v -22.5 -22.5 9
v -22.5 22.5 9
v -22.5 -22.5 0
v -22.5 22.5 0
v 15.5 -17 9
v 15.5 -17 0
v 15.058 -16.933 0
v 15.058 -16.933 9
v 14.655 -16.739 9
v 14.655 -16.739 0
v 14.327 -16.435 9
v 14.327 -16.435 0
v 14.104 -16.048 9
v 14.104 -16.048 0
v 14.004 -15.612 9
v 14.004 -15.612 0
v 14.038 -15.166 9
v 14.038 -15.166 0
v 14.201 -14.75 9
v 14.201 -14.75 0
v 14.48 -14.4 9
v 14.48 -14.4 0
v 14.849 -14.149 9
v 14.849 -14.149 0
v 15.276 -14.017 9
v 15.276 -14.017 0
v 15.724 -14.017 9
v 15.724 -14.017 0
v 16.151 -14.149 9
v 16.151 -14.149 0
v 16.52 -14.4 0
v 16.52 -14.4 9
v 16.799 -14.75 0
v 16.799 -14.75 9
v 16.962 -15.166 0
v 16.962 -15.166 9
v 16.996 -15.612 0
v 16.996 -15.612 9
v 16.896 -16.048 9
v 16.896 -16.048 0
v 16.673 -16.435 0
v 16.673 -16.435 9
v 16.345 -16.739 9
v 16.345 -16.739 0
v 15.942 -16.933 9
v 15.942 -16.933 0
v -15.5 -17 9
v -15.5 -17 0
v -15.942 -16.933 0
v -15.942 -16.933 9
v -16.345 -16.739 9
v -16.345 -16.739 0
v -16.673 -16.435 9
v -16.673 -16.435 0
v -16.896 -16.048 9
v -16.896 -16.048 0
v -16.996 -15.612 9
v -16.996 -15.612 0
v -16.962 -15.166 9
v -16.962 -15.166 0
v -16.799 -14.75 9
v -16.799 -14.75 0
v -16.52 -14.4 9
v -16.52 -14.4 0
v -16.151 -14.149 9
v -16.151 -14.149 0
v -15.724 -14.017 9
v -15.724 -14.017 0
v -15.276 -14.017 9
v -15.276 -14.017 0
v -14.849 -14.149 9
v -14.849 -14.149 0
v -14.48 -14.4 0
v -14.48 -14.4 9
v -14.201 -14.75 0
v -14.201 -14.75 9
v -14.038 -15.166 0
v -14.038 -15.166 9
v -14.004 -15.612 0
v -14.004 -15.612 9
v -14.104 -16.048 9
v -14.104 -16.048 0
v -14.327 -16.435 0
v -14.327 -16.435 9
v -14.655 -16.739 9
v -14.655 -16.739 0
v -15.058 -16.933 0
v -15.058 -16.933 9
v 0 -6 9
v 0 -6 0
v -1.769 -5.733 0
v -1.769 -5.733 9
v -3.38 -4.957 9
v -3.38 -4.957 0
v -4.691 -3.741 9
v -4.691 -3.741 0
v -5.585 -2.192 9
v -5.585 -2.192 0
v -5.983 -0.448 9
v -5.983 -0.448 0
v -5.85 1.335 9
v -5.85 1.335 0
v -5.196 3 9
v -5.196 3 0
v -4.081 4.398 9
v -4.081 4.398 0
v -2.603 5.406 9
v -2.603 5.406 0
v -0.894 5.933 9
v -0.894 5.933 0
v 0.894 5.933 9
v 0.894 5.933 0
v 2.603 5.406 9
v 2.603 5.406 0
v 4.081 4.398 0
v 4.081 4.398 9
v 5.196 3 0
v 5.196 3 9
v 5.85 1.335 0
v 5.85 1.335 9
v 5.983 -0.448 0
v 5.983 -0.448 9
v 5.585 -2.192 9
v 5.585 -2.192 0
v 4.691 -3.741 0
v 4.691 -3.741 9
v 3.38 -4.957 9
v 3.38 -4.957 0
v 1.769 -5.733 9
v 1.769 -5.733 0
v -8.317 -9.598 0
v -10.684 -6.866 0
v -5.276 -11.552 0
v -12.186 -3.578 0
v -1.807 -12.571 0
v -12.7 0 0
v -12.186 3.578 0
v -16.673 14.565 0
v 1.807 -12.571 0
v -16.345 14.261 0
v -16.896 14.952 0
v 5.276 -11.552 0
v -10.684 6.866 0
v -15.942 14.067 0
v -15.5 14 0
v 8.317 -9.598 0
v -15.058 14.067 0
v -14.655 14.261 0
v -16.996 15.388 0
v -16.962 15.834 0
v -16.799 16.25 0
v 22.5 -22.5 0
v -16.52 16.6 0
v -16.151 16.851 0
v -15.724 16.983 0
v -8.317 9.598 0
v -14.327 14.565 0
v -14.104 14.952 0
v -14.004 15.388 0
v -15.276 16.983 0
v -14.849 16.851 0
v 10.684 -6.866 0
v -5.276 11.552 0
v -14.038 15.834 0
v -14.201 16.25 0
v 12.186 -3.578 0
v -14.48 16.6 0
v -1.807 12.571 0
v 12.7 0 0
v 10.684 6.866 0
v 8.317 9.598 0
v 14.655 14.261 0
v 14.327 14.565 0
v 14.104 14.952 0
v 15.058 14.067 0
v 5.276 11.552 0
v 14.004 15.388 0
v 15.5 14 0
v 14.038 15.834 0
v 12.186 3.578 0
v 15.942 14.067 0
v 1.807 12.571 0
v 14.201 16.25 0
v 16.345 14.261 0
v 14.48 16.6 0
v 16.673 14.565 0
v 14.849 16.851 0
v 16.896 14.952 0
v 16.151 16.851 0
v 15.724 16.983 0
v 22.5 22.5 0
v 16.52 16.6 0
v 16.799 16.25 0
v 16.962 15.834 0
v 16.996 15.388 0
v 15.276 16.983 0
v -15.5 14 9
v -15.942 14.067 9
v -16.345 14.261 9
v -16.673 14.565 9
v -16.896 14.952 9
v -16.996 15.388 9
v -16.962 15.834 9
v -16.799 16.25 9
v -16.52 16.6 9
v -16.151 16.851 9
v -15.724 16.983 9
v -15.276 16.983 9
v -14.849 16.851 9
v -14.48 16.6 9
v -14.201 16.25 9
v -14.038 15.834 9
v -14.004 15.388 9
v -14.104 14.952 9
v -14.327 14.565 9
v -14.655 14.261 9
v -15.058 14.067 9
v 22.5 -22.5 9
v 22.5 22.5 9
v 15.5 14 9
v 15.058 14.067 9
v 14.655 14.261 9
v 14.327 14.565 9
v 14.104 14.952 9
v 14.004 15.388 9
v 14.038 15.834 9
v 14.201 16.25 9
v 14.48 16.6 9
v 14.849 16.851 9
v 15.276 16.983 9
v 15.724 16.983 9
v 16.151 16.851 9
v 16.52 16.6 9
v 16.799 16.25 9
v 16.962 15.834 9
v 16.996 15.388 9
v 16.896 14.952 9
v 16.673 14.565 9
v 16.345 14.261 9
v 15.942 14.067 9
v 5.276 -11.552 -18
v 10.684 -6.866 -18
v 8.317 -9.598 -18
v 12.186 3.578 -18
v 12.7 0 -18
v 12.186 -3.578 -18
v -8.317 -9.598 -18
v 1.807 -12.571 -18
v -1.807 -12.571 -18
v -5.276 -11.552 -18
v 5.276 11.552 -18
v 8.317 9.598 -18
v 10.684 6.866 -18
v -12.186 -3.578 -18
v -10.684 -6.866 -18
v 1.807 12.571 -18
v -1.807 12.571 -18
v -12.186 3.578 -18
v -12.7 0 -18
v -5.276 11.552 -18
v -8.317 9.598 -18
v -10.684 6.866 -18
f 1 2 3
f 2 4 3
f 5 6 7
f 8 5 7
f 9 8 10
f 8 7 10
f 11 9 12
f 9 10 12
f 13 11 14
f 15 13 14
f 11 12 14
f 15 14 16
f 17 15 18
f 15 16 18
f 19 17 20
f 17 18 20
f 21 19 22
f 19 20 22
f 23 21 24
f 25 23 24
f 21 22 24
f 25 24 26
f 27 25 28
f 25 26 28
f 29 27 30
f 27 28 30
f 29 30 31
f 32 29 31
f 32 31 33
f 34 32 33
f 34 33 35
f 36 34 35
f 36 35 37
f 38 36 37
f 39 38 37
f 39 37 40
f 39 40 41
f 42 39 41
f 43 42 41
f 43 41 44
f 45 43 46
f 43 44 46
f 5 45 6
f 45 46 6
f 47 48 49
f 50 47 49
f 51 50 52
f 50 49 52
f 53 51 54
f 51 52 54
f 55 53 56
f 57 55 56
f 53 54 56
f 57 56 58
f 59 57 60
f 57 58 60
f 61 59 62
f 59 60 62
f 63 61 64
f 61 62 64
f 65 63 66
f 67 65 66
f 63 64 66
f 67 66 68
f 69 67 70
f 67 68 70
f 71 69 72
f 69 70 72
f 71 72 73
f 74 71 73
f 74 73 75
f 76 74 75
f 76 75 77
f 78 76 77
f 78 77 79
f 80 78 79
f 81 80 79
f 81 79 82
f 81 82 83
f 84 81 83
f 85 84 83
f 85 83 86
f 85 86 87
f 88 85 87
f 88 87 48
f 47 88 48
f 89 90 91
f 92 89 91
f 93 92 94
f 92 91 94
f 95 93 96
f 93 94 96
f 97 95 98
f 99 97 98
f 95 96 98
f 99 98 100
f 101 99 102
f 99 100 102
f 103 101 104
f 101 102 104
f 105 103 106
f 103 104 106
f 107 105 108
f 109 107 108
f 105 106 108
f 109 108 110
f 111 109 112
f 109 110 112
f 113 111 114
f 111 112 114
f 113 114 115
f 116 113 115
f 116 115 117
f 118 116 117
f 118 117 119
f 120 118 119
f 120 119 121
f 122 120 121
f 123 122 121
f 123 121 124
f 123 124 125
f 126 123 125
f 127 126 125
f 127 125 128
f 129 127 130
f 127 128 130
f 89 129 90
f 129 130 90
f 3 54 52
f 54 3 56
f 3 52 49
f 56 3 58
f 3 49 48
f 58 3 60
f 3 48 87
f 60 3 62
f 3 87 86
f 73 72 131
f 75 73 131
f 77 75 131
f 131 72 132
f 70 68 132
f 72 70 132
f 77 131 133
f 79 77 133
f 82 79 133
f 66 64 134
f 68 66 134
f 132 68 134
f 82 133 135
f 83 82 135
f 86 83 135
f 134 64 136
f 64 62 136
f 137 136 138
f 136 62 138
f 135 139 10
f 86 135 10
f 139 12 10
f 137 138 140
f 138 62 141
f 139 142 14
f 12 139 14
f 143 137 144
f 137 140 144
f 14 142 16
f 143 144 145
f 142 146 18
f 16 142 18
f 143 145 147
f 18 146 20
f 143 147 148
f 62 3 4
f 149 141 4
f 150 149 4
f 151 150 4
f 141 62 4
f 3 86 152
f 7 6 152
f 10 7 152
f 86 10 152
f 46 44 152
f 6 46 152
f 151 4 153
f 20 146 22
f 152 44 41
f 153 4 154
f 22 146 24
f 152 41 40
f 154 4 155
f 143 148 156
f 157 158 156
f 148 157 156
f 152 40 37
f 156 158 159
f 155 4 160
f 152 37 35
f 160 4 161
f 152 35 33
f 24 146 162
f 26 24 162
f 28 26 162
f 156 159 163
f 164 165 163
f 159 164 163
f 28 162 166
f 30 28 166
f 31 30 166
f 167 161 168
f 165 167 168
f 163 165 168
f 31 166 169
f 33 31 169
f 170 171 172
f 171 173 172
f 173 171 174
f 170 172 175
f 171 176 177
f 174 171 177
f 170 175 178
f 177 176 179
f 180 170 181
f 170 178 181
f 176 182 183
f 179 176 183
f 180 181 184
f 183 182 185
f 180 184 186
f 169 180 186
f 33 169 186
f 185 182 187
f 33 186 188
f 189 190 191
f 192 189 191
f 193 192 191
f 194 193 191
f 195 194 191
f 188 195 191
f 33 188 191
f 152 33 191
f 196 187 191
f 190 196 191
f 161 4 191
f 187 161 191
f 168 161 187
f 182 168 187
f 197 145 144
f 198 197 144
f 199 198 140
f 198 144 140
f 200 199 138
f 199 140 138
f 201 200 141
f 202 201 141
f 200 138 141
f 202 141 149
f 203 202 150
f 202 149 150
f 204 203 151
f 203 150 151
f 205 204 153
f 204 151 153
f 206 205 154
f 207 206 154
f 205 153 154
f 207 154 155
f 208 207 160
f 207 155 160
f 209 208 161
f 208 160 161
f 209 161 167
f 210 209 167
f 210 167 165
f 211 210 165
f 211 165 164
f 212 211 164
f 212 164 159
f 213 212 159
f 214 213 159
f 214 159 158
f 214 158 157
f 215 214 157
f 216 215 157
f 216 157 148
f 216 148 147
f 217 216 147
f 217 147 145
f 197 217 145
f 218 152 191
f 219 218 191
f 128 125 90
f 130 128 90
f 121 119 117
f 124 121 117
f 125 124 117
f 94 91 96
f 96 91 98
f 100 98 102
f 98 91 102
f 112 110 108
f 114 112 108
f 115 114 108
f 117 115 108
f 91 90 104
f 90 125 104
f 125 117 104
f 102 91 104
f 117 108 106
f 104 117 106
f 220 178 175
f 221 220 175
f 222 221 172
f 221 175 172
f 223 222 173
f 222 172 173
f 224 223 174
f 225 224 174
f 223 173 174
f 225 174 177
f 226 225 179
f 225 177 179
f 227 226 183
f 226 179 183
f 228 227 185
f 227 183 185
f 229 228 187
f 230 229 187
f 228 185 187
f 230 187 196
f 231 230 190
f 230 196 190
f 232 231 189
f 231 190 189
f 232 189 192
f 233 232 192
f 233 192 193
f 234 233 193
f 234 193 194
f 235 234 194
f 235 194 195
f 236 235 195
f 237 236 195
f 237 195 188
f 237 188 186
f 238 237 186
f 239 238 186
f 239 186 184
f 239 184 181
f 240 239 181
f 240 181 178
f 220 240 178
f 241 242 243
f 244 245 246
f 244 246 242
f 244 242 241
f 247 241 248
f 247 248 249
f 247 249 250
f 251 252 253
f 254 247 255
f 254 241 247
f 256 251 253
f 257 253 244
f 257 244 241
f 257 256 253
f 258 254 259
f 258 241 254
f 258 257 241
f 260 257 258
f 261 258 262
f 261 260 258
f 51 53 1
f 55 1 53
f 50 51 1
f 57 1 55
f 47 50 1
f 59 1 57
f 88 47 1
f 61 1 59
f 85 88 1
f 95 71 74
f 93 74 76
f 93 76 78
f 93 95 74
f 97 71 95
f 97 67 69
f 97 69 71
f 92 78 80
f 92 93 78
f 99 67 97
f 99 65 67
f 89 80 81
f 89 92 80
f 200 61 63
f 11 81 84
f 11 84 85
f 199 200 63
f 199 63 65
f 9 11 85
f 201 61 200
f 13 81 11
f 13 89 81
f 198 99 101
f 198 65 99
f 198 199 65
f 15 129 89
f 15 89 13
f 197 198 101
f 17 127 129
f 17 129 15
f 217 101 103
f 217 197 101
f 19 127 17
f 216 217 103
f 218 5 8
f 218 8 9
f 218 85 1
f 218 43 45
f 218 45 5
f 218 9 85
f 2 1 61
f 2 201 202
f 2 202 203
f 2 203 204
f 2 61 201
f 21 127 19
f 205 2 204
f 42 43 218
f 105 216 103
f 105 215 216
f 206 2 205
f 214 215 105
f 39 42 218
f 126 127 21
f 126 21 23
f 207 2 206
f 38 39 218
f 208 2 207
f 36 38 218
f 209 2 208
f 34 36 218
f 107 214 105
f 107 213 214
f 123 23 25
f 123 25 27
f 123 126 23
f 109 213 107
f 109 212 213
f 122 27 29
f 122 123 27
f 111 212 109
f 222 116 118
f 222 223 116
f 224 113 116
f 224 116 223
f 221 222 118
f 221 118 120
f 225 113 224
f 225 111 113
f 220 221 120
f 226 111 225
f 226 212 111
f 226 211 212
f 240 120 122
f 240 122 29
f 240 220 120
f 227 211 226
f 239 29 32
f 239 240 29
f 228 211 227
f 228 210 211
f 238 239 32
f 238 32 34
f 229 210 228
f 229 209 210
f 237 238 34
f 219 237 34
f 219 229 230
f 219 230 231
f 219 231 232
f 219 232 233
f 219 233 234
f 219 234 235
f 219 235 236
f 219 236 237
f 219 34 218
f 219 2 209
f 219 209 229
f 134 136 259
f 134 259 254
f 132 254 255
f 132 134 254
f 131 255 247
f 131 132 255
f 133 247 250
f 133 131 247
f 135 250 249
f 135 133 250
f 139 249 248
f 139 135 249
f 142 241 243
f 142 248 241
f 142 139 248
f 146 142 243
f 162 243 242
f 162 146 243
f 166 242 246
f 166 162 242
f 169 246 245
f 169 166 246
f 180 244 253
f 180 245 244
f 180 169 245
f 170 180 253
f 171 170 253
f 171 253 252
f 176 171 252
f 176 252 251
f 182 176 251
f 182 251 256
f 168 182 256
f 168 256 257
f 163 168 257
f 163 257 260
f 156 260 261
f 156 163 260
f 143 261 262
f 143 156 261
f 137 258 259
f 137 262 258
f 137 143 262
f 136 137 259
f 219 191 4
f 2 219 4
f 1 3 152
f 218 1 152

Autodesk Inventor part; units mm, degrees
ref_plane "YZ Plane" through (0, 0, 0) normal (1, 0, 0) x (0, 1, 0)
ref_plane "XZ Plane" through (0, 0, 0) normal (0, 1, 0) x (-1, 0, 0)
ref_plane "XY Plane" through (0, 0, 0) normal (0, 0, 1) x (1, 0, 0)
sketch "Boceto1" plane through (0, 0, 0) normal (0, 0, 1) x (1, 0, 0)
  line L0 (-22.5, -22.5) -> (22.5, -22.5)
  line L1 (22.5, -22.5) -> (22.5, 22.5)
  line L2 (22.5, 22.5) -> (-22.5, 22.5)
  line L3 (-22.5, 22.5) -> (-22.5, -22.5)
  line L4 (-22.5, -22.5) -> (22.5, 22.5) construction
  line L5 (22.5, -22.5) -> (-22.5, 22.5) construction
  point P0 (0, 0)
  dimension "d0" = 45
  dimension "d1" = 45
extrude "Extrusión1" add sketch "Boceto1" along normal blind 9
sketch "Boceto2" plane through (0, 0, 9) normal (0, 0, 1) x (1, 0, 0)
  circle A0 centre (0, 0) radius 6
  dimension "d4" = 12
hole "Agujero1" at (0, 0, 9) direction (0, 0, -1) diameter 12 depth 9
sketch "Boceto3" plane through (0, 0, 9) normal (0, 0, 1) x (1, 0, 0)
  line L0 (-15.5, -15.5) -> (15.5, -15.5)
  line L1 (15.5, -15.5) -> (15.5, 15.5)
  line L2 (15.5, 15.5) -> (-15.5, 15.5)
  line L3 (-15.5, 15.5) -> (-15.5, -15.5)
  line L4 (-15.5, -15.5) -> (15.5, 15.5) construction
  line L5 (15.5, -15.5) -> (-15.5, 15.5) construction
  line L6 (0, 15.5) -> (0, -15.5)
  line L7 (-15.5, 0) -> (15.5, 0)
  point P0 (0, 0)
  dimension "d12" = 31
  dimension "d13" = 31
hole "Agujero2" at (-15.5, 15.5, 9) at (-15.5, -15.5, 9) at (15.5, -15.5, 9) at (15.5, 15.5, 9) direction (0, 0, -1) diameter 3 depth 9 tip angle 118
sketch "Boceto4" plane through (0, 0, 0) normal (0, 0, -1) x (-1, 0, 0)
  circle A0 centre (0, 0) radius 12.7
  dimension "d21" = 25.4
extrude "Extrusión2" add sketch "Boceto4" along normal blind 18
properties part number "soporte"
